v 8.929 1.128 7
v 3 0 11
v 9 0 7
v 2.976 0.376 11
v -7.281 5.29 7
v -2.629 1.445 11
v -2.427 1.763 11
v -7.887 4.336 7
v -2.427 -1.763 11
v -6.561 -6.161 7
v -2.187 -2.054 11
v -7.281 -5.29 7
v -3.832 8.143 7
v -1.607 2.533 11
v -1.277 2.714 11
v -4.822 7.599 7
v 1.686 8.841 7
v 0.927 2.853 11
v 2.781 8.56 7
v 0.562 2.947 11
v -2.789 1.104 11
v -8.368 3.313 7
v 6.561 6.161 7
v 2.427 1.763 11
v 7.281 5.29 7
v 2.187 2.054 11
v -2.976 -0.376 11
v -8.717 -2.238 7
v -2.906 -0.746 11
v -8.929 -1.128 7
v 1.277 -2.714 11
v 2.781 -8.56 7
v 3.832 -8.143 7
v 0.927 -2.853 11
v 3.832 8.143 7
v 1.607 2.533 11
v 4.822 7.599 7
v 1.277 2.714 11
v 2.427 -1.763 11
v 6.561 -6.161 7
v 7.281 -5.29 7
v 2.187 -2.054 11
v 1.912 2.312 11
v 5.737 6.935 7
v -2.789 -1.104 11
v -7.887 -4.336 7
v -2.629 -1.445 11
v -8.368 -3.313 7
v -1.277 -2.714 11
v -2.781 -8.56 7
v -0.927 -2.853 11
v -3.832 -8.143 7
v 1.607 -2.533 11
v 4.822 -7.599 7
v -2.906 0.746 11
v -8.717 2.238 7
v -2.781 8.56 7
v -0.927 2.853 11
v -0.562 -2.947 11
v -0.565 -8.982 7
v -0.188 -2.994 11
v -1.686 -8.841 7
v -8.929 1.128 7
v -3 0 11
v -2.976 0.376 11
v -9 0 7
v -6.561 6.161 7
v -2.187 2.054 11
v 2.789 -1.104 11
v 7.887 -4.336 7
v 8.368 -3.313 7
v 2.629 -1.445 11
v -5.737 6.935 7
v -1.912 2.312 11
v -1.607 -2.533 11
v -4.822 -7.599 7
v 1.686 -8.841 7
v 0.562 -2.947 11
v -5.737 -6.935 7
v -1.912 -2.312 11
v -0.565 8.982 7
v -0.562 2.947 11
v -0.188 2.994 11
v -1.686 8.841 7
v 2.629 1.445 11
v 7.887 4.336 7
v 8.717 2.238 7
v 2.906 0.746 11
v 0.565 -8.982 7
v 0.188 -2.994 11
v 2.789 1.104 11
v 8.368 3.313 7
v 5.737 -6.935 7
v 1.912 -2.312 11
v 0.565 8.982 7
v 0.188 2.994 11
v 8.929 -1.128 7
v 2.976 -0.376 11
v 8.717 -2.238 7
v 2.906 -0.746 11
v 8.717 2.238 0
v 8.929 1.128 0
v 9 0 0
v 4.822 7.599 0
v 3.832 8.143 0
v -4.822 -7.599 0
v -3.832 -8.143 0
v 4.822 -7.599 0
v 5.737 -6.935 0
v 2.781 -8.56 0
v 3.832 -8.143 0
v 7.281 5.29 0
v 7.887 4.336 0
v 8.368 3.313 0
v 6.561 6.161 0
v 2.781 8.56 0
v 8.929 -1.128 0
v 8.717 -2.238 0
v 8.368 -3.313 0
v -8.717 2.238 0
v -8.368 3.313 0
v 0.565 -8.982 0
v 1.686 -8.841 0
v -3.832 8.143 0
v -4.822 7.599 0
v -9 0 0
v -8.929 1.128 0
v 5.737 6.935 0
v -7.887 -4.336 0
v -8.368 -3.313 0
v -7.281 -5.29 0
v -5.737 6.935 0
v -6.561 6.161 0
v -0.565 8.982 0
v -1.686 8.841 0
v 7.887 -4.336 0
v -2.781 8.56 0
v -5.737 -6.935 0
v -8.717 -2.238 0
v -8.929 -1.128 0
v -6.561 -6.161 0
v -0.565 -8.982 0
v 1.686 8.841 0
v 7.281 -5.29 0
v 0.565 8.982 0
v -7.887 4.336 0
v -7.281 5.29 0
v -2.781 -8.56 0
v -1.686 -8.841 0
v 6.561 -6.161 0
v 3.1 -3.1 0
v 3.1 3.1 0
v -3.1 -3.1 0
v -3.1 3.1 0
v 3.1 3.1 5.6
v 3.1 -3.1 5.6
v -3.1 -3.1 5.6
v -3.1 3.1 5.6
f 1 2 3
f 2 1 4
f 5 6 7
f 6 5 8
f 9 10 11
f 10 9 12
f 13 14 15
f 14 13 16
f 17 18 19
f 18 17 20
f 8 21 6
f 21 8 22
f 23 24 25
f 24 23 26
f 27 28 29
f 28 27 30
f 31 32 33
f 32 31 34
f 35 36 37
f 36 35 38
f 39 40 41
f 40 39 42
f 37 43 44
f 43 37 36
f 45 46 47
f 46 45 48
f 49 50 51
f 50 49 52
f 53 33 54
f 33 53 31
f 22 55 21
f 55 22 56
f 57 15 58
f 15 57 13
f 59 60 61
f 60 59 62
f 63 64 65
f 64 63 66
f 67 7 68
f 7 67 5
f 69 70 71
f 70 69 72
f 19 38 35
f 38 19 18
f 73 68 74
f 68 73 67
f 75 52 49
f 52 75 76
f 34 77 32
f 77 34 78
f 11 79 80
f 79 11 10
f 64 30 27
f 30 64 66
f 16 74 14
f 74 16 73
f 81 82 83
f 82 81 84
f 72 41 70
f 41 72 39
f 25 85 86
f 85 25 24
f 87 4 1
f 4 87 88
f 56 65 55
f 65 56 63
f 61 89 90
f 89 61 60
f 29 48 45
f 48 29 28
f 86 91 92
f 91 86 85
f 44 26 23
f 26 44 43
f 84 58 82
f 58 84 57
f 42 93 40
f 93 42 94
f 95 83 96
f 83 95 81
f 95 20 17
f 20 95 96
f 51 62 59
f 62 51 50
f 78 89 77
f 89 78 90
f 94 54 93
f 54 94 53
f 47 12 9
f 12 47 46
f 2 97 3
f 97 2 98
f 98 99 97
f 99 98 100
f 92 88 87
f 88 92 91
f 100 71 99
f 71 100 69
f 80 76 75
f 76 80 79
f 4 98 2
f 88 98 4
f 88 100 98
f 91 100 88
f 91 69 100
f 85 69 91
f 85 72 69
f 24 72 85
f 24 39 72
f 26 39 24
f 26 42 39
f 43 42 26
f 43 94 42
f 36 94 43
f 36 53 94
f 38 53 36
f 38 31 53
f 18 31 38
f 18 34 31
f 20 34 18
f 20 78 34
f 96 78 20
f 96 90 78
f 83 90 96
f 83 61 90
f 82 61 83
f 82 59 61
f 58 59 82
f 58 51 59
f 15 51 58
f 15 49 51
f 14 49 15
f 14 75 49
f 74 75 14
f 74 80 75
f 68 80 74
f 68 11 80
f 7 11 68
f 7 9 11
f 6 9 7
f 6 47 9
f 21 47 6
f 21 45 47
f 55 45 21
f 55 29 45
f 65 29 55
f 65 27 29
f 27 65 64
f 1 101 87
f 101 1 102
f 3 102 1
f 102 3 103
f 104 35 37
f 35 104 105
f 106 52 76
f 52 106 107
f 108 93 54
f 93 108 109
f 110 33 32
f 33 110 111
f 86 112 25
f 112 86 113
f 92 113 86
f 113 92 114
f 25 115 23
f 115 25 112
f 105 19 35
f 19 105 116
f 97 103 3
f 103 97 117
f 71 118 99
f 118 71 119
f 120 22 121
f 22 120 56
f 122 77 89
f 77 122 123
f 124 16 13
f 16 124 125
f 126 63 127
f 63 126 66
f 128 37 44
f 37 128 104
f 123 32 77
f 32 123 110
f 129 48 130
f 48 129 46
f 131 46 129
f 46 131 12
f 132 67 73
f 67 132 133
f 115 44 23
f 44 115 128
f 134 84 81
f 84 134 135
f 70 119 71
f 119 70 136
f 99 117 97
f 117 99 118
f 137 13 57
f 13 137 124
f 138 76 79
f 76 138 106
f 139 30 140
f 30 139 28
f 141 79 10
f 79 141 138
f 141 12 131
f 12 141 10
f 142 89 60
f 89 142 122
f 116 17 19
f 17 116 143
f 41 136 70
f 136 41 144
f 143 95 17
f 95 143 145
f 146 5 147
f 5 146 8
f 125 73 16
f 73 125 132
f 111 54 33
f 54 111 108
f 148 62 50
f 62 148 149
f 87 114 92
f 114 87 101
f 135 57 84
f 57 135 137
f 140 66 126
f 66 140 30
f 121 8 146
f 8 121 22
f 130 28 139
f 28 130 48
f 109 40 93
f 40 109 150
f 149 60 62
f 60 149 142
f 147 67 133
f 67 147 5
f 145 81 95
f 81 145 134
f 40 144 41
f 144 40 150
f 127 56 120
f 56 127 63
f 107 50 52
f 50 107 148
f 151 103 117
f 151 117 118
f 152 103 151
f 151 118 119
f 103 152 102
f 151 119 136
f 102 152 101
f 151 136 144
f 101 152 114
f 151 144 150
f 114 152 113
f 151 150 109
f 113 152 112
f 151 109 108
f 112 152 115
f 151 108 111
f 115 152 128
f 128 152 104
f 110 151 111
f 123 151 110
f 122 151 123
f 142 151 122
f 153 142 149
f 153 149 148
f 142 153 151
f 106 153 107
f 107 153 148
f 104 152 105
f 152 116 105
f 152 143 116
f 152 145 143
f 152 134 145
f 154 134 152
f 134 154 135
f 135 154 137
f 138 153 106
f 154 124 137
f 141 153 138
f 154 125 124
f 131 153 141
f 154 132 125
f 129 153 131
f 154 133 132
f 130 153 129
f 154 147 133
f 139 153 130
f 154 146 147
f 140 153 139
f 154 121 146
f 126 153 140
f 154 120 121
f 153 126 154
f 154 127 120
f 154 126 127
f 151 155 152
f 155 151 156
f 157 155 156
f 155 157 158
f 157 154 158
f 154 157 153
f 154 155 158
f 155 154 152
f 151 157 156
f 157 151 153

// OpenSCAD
difference() {
  union() {
    cylinder(h = 7, r = 9);
    translate([0, 0, 7]) {
      intersection() {
        cylinder(h = 6, r1 = 9, r2 = 0);
        cylinder(h = 4, r = 9);
      }
    }
  }
  translate([-3.1, -3.1, -0.2]) {
    cube([6.2, 6.2, 5.8]);
  }
}
$fn = 50;
